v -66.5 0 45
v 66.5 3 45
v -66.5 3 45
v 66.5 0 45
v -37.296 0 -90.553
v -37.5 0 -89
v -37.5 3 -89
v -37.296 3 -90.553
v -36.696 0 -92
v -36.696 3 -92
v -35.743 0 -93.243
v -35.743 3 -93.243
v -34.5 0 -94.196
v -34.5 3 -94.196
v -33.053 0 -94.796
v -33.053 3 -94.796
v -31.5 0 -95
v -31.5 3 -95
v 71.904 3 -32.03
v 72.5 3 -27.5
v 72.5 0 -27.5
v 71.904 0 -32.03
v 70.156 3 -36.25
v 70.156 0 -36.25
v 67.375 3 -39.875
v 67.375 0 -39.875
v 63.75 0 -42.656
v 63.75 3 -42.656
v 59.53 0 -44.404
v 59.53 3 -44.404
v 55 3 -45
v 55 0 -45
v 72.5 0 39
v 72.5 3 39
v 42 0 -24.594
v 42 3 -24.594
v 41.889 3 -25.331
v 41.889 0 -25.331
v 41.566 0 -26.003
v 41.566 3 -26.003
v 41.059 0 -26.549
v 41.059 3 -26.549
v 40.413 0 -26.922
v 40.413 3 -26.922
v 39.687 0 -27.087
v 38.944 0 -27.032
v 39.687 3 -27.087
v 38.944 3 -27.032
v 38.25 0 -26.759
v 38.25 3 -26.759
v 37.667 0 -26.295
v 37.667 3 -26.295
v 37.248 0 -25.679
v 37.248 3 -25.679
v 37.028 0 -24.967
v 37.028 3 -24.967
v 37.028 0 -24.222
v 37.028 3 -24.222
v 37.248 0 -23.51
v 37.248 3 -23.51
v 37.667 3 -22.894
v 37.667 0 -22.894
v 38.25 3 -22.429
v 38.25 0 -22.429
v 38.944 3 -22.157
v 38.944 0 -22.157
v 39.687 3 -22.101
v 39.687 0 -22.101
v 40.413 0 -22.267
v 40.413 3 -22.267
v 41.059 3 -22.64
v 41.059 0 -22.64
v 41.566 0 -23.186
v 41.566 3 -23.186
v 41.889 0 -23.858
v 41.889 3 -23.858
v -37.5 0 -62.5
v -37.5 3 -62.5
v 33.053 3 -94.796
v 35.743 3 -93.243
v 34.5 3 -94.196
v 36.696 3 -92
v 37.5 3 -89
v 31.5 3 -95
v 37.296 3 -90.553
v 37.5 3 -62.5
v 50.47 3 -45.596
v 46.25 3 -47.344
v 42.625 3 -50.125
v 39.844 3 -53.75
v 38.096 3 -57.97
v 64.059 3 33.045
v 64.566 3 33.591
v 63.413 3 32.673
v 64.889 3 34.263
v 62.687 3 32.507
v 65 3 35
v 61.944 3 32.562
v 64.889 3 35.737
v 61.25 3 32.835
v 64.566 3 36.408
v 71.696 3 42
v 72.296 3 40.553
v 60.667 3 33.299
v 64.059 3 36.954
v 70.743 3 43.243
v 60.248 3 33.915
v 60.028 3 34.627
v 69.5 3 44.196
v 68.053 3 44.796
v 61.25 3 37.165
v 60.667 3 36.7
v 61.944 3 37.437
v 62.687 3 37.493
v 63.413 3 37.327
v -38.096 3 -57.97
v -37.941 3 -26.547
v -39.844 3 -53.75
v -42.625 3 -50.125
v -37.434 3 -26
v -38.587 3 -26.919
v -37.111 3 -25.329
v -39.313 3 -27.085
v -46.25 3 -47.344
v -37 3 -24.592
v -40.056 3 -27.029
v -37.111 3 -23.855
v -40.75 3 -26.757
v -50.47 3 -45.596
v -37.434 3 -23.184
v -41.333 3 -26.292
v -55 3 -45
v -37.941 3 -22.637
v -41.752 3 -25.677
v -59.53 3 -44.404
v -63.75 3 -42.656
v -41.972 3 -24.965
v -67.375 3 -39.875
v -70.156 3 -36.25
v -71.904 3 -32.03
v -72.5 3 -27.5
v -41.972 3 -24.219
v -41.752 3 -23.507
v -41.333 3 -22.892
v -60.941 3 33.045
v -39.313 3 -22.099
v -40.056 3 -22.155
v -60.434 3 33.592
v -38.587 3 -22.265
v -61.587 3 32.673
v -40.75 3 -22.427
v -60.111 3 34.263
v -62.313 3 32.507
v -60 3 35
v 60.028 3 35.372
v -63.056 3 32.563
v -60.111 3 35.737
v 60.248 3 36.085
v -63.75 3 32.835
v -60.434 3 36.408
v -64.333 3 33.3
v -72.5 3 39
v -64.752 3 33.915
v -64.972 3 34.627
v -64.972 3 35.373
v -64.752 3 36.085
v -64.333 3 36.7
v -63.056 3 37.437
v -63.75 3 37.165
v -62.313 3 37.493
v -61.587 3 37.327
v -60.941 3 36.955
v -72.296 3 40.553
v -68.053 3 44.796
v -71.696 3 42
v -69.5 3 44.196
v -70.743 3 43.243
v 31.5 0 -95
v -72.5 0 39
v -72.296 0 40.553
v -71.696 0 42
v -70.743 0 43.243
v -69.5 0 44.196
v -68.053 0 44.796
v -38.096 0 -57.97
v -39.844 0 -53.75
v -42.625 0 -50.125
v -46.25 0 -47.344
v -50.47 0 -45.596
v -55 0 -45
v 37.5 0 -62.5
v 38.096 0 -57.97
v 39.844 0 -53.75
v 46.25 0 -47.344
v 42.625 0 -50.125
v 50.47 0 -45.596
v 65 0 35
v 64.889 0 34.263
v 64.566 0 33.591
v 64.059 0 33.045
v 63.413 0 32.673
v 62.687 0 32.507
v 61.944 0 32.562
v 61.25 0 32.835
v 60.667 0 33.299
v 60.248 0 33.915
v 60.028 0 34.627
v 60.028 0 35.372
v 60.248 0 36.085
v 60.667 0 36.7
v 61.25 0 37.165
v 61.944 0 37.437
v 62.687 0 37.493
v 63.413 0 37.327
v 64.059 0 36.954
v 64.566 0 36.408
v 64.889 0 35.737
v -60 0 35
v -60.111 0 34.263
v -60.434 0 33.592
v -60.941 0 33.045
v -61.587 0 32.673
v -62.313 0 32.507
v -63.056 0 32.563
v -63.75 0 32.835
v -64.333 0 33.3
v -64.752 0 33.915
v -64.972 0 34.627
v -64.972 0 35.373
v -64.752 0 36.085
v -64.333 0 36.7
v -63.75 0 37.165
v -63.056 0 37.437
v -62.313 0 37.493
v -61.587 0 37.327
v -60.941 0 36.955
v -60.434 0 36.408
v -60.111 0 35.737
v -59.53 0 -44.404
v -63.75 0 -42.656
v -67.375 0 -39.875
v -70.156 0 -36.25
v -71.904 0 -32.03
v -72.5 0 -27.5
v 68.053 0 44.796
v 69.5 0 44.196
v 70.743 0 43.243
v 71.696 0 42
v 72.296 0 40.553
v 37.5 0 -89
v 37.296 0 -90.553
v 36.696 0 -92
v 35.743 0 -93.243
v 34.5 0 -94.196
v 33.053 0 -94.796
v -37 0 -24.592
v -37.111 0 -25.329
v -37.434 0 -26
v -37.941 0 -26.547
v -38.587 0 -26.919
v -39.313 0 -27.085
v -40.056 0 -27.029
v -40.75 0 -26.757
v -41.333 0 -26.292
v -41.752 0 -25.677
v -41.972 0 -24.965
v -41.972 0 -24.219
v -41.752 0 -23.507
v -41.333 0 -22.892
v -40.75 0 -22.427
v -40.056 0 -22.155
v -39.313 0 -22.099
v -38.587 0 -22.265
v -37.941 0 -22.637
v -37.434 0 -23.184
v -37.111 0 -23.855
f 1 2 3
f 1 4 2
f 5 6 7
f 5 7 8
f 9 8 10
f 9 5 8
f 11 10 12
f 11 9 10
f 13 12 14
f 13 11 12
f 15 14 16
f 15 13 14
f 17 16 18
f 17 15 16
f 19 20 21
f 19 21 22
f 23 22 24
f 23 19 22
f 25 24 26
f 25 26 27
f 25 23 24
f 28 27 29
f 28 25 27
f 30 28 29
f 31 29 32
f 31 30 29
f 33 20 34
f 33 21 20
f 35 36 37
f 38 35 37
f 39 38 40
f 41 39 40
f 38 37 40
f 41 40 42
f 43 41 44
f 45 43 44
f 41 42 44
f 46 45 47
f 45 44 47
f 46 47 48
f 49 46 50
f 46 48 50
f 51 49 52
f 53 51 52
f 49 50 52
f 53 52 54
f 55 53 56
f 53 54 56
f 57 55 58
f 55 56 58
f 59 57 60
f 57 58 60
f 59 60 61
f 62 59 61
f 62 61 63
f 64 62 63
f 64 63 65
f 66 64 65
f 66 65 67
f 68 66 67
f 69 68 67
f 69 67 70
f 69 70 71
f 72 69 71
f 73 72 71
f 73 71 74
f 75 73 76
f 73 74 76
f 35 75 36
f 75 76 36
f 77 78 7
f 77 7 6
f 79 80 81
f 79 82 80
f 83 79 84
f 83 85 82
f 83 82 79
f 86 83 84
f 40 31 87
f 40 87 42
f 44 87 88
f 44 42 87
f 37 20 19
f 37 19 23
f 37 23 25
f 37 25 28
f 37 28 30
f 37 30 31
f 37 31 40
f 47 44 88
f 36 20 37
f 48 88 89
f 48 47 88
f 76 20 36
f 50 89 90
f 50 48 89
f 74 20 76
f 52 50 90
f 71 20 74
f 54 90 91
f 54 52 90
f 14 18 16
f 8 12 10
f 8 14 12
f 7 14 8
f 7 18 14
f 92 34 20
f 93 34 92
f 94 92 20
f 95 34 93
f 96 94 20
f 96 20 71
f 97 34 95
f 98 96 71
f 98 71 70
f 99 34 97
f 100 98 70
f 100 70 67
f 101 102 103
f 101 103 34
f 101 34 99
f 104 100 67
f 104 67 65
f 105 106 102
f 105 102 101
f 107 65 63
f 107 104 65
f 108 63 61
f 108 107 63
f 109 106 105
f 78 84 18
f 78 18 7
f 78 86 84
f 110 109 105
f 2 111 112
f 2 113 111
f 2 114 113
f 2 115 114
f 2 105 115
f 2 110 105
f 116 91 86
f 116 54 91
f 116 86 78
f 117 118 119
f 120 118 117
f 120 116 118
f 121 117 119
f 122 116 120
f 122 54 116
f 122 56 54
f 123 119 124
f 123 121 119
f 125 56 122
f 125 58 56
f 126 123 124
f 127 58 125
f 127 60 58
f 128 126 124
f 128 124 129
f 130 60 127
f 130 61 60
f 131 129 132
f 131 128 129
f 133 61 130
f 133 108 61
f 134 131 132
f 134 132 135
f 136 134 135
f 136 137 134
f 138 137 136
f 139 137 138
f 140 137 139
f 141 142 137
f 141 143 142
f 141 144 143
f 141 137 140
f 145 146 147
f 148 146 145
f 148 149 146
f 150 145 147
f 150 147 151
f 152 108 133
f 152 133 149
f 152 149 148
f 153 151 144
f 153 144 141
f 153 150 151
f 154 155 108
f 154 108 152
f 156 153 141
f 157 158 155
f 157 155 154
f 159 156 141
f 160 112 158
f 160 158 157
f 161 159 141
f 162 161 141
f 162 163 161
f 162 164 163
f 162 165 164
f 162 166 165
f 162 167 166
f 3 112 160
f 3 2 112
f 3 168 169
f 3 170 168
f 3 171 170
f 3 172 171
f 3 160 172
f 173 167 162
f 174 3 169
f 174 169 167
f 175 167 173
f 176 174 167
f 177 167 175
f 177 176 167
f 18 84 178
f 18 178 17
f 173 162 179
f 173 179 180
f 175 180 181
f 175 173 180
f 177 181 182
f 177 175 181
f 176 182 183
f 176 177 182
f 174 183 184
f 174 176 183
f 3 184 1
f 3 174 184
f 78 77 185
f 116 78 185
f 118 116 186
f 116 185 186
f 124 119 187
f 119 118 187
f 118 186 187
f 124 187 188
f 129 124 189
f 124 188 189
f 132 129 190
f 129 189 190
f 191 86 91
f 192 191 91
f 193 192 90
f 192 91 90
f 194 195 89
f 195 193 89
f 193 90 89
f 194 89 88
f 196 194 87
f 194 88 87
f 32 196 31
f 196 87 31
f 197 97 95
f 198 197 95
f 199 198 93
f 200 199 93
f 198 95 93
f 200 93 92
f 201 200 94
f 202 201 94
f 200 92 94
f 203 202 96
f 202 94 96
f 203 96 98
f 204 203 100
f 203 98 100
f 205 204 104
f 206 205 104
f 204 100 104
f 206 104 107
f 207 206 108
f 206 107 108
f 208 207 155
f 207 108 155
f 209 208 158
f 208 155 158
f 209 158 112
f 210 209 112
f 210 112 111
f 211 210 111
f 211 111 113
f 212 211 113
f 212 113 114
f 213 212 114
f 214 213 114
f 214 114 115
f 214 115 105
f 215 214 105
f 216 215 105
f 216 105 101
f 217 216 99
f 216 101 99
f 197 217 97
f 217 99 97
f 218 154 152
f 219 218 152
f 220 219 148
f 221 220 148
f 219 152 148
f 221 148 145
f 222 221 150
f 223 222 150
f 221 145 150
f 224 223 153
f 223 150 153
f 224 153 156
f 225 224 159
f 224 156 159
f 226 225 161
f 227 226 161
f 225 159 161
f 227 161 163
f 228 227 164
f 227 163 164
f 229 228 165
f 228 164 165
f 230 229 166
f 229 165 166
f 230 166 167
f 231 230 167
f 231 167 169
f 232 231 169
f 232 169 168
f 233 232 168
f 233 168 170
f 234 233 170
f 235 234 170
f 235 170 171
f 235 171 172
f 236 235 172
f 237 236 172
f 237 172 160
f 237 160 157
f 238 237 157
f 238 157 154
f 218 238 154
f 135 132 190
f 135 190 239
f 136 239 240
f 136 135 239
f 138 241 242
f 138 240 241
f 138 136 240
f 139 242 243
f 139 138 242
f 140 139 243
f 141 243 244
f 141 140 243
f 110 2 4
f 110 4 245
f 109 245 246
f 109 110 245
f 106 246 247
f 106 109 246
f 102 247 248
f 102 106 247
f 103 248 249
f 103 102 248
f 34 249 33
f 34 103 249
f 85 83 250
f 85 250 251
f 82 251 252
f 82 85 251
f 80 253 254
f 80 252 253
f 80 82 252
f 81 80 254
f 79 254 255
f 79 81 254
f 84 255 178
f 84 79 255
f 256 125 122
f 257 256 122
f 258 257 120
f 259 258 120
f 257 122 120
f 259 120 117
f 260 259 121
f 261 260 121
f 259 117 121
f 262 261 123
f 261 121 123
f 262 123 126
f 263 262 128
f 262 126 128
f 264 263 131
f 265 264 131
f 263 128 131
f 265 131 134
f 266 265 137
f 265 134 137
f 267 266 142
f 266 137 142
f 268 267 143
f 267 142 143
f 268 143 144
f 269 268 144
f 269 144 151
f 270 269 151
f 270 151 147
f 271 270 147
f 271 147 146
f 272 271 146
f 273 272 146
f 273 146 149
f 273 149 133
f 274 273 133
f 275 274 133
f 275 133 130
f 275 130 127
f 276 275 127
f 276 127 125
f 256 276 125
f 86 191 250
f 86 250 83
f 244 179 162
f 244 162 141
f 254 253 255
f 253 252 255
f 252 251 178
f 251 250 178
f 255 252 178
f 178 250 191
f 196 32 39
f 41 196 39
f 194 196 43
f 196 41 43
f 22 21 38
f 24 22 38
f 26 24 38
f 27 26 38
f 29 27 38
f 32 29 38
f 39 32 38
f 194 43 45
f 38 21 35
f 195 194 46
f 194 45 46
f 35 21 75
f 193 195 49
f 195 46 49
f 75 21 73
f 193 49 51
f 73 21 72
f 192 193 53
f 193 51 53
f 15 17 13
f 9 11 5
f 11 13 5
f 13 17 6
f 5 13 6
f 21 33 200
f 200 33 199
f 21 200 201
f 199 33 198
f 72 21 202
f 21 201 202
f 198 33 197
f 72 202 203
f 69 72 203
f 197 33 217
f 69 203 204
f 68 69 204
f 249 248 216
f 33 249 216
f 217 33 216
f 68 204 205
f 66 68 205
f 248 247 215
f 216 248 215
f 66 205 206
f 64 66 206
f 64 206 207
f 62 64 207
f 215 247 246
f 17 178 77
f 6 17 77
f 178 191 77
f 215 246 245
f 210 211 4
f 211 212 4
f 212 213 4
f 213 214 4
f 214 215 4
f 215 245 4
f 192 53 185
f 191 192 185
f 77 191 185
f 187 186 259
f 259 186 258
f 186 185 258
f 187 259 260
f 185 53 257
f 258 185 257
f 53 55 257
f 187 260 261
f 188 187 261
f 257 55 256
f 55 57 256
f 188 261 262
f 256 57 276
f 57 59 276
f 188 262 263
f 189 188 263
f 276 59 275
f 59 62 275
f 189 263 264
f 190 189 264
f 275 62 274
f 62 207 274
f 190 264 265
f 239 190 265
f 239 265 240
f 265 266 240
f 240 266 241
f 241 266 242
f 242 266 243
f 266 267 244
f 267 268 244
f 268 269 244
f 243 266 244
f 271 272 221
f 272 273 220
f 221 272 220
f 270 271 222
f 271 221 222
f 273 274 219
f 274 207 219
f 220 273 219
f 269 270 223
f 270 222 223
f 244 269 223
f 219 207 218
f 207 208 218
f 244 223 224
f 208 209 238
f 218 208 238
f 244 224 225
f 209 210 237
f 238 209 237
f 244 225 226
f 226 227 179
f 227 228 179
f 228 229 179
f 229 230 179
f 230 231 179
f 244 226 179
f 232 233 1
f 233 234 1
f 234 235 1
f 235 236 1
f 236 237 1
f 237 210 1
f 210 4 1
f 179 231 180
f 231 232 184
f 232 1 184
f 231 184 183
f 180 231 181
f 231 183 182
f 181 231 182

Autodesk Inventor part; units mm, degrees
ref_plane "YZ Plane" through (0, 0, 0) normal (1, 0, 0) x (0, 1, 0)
ref_plane "XZ Plane" through (0, 0, 0) normal (0, 1, 0) x (-1, 0, 0)
ref_plane "XY Plane" through (0, 0, 0) normal (0, 0, 1) x (1, 0, 0)
sketch "Sketch1" plane through (0, 0, 0) normal (0, 1, 0) x (-1, 0, 0)
  line L0 (72.5, -45) -> (-72.5, -45)
  line L1 (-72.5, -45) -> (-72.5, 45)
  line L2 (-72.5, 45) -> (72.5, 45)
  line L3 (72.5, 45) -> (72.5, -45)
  line L4 (72.5, -45) -> (-72.5, 45) construction
  line L5 (-72.5, -45) -> (72.5, 45) construction
  point P0 (0, 0)
  dimension "d0" = 145
  dimension "d1" = 90
extrude "Extrusion1" add sketch "Sketch1" along normal blind 3
sketch "Sketch4" plane through (72.5, 0, -45) normal (0, 0, -1) x (-1, 0, 0)
  line L0 (35, 3) -> (110, 3)
  line L1 (110, 3) -> (110, 0)
  line L2 (110, 0) -> (35, 0)
  line L3 (35, 0) -> (35, 3)
  line L4 (35, 3) -> (110, 0) construction
  line L5 (110, 3) -> (35, 0) construction
  line L6 (0, 3) -> (145, 3) projected
  point P0 (72.5, 0)
  point P1 (72.5, 1.5)
  dimension "d28" = 75
  dimension "d29" = 3
  dimension "d30" = 0
extrude "Extrusion3" add sketch "Sketch4" along normal blind 50
sketch "Sketch3" plane through (0, 3, 0) normal (0, 1, 0) x (1, 0, 0)
  circle A0 centre (62.5, -34.9998) radius 2.5
  circle A1 centre (-62.5, -35) radius 2.5
  circle A2 centre (-39.5, 24.592) radius 2.5
  circle A3 centre (39.5, 24.5944) radius 2.5
  line L0 (-72.5, 45) -> (-72.5, -45) projected
  line L1 (-72.5, -45) -> (72.5, -45) projected
  point P0 (0, 0)
  dimension "d4" = 5
  dimension "d7" = 5
  dimension "d10" = 5
  dimension "d13" = 5
  dimension "d20" = 79
  dimension "d21" = 125
  dimension "d22" = 23
  dimension "d23" = 59.592
  dimension "d24" = 10
  dimension "d25" = 10
extrude "Extrusion2" cut sketch "Sketch3" against normal through all
fillet "Fillet1" radius 6 4 edges at (72.5, 1.5, 45) (-72.5, 1.5, 45) (-37.5, 1.5, -95) (37.5, 1.5, -95)
fillet "Fillet2" radius 17.5 4 edges at (72.5, 1.5, -45) (-72.5, 1.5, -45) (37.5, 1.5, -45) (-37.5, 1.5, -45)
properties part number "chasis_arriba"
